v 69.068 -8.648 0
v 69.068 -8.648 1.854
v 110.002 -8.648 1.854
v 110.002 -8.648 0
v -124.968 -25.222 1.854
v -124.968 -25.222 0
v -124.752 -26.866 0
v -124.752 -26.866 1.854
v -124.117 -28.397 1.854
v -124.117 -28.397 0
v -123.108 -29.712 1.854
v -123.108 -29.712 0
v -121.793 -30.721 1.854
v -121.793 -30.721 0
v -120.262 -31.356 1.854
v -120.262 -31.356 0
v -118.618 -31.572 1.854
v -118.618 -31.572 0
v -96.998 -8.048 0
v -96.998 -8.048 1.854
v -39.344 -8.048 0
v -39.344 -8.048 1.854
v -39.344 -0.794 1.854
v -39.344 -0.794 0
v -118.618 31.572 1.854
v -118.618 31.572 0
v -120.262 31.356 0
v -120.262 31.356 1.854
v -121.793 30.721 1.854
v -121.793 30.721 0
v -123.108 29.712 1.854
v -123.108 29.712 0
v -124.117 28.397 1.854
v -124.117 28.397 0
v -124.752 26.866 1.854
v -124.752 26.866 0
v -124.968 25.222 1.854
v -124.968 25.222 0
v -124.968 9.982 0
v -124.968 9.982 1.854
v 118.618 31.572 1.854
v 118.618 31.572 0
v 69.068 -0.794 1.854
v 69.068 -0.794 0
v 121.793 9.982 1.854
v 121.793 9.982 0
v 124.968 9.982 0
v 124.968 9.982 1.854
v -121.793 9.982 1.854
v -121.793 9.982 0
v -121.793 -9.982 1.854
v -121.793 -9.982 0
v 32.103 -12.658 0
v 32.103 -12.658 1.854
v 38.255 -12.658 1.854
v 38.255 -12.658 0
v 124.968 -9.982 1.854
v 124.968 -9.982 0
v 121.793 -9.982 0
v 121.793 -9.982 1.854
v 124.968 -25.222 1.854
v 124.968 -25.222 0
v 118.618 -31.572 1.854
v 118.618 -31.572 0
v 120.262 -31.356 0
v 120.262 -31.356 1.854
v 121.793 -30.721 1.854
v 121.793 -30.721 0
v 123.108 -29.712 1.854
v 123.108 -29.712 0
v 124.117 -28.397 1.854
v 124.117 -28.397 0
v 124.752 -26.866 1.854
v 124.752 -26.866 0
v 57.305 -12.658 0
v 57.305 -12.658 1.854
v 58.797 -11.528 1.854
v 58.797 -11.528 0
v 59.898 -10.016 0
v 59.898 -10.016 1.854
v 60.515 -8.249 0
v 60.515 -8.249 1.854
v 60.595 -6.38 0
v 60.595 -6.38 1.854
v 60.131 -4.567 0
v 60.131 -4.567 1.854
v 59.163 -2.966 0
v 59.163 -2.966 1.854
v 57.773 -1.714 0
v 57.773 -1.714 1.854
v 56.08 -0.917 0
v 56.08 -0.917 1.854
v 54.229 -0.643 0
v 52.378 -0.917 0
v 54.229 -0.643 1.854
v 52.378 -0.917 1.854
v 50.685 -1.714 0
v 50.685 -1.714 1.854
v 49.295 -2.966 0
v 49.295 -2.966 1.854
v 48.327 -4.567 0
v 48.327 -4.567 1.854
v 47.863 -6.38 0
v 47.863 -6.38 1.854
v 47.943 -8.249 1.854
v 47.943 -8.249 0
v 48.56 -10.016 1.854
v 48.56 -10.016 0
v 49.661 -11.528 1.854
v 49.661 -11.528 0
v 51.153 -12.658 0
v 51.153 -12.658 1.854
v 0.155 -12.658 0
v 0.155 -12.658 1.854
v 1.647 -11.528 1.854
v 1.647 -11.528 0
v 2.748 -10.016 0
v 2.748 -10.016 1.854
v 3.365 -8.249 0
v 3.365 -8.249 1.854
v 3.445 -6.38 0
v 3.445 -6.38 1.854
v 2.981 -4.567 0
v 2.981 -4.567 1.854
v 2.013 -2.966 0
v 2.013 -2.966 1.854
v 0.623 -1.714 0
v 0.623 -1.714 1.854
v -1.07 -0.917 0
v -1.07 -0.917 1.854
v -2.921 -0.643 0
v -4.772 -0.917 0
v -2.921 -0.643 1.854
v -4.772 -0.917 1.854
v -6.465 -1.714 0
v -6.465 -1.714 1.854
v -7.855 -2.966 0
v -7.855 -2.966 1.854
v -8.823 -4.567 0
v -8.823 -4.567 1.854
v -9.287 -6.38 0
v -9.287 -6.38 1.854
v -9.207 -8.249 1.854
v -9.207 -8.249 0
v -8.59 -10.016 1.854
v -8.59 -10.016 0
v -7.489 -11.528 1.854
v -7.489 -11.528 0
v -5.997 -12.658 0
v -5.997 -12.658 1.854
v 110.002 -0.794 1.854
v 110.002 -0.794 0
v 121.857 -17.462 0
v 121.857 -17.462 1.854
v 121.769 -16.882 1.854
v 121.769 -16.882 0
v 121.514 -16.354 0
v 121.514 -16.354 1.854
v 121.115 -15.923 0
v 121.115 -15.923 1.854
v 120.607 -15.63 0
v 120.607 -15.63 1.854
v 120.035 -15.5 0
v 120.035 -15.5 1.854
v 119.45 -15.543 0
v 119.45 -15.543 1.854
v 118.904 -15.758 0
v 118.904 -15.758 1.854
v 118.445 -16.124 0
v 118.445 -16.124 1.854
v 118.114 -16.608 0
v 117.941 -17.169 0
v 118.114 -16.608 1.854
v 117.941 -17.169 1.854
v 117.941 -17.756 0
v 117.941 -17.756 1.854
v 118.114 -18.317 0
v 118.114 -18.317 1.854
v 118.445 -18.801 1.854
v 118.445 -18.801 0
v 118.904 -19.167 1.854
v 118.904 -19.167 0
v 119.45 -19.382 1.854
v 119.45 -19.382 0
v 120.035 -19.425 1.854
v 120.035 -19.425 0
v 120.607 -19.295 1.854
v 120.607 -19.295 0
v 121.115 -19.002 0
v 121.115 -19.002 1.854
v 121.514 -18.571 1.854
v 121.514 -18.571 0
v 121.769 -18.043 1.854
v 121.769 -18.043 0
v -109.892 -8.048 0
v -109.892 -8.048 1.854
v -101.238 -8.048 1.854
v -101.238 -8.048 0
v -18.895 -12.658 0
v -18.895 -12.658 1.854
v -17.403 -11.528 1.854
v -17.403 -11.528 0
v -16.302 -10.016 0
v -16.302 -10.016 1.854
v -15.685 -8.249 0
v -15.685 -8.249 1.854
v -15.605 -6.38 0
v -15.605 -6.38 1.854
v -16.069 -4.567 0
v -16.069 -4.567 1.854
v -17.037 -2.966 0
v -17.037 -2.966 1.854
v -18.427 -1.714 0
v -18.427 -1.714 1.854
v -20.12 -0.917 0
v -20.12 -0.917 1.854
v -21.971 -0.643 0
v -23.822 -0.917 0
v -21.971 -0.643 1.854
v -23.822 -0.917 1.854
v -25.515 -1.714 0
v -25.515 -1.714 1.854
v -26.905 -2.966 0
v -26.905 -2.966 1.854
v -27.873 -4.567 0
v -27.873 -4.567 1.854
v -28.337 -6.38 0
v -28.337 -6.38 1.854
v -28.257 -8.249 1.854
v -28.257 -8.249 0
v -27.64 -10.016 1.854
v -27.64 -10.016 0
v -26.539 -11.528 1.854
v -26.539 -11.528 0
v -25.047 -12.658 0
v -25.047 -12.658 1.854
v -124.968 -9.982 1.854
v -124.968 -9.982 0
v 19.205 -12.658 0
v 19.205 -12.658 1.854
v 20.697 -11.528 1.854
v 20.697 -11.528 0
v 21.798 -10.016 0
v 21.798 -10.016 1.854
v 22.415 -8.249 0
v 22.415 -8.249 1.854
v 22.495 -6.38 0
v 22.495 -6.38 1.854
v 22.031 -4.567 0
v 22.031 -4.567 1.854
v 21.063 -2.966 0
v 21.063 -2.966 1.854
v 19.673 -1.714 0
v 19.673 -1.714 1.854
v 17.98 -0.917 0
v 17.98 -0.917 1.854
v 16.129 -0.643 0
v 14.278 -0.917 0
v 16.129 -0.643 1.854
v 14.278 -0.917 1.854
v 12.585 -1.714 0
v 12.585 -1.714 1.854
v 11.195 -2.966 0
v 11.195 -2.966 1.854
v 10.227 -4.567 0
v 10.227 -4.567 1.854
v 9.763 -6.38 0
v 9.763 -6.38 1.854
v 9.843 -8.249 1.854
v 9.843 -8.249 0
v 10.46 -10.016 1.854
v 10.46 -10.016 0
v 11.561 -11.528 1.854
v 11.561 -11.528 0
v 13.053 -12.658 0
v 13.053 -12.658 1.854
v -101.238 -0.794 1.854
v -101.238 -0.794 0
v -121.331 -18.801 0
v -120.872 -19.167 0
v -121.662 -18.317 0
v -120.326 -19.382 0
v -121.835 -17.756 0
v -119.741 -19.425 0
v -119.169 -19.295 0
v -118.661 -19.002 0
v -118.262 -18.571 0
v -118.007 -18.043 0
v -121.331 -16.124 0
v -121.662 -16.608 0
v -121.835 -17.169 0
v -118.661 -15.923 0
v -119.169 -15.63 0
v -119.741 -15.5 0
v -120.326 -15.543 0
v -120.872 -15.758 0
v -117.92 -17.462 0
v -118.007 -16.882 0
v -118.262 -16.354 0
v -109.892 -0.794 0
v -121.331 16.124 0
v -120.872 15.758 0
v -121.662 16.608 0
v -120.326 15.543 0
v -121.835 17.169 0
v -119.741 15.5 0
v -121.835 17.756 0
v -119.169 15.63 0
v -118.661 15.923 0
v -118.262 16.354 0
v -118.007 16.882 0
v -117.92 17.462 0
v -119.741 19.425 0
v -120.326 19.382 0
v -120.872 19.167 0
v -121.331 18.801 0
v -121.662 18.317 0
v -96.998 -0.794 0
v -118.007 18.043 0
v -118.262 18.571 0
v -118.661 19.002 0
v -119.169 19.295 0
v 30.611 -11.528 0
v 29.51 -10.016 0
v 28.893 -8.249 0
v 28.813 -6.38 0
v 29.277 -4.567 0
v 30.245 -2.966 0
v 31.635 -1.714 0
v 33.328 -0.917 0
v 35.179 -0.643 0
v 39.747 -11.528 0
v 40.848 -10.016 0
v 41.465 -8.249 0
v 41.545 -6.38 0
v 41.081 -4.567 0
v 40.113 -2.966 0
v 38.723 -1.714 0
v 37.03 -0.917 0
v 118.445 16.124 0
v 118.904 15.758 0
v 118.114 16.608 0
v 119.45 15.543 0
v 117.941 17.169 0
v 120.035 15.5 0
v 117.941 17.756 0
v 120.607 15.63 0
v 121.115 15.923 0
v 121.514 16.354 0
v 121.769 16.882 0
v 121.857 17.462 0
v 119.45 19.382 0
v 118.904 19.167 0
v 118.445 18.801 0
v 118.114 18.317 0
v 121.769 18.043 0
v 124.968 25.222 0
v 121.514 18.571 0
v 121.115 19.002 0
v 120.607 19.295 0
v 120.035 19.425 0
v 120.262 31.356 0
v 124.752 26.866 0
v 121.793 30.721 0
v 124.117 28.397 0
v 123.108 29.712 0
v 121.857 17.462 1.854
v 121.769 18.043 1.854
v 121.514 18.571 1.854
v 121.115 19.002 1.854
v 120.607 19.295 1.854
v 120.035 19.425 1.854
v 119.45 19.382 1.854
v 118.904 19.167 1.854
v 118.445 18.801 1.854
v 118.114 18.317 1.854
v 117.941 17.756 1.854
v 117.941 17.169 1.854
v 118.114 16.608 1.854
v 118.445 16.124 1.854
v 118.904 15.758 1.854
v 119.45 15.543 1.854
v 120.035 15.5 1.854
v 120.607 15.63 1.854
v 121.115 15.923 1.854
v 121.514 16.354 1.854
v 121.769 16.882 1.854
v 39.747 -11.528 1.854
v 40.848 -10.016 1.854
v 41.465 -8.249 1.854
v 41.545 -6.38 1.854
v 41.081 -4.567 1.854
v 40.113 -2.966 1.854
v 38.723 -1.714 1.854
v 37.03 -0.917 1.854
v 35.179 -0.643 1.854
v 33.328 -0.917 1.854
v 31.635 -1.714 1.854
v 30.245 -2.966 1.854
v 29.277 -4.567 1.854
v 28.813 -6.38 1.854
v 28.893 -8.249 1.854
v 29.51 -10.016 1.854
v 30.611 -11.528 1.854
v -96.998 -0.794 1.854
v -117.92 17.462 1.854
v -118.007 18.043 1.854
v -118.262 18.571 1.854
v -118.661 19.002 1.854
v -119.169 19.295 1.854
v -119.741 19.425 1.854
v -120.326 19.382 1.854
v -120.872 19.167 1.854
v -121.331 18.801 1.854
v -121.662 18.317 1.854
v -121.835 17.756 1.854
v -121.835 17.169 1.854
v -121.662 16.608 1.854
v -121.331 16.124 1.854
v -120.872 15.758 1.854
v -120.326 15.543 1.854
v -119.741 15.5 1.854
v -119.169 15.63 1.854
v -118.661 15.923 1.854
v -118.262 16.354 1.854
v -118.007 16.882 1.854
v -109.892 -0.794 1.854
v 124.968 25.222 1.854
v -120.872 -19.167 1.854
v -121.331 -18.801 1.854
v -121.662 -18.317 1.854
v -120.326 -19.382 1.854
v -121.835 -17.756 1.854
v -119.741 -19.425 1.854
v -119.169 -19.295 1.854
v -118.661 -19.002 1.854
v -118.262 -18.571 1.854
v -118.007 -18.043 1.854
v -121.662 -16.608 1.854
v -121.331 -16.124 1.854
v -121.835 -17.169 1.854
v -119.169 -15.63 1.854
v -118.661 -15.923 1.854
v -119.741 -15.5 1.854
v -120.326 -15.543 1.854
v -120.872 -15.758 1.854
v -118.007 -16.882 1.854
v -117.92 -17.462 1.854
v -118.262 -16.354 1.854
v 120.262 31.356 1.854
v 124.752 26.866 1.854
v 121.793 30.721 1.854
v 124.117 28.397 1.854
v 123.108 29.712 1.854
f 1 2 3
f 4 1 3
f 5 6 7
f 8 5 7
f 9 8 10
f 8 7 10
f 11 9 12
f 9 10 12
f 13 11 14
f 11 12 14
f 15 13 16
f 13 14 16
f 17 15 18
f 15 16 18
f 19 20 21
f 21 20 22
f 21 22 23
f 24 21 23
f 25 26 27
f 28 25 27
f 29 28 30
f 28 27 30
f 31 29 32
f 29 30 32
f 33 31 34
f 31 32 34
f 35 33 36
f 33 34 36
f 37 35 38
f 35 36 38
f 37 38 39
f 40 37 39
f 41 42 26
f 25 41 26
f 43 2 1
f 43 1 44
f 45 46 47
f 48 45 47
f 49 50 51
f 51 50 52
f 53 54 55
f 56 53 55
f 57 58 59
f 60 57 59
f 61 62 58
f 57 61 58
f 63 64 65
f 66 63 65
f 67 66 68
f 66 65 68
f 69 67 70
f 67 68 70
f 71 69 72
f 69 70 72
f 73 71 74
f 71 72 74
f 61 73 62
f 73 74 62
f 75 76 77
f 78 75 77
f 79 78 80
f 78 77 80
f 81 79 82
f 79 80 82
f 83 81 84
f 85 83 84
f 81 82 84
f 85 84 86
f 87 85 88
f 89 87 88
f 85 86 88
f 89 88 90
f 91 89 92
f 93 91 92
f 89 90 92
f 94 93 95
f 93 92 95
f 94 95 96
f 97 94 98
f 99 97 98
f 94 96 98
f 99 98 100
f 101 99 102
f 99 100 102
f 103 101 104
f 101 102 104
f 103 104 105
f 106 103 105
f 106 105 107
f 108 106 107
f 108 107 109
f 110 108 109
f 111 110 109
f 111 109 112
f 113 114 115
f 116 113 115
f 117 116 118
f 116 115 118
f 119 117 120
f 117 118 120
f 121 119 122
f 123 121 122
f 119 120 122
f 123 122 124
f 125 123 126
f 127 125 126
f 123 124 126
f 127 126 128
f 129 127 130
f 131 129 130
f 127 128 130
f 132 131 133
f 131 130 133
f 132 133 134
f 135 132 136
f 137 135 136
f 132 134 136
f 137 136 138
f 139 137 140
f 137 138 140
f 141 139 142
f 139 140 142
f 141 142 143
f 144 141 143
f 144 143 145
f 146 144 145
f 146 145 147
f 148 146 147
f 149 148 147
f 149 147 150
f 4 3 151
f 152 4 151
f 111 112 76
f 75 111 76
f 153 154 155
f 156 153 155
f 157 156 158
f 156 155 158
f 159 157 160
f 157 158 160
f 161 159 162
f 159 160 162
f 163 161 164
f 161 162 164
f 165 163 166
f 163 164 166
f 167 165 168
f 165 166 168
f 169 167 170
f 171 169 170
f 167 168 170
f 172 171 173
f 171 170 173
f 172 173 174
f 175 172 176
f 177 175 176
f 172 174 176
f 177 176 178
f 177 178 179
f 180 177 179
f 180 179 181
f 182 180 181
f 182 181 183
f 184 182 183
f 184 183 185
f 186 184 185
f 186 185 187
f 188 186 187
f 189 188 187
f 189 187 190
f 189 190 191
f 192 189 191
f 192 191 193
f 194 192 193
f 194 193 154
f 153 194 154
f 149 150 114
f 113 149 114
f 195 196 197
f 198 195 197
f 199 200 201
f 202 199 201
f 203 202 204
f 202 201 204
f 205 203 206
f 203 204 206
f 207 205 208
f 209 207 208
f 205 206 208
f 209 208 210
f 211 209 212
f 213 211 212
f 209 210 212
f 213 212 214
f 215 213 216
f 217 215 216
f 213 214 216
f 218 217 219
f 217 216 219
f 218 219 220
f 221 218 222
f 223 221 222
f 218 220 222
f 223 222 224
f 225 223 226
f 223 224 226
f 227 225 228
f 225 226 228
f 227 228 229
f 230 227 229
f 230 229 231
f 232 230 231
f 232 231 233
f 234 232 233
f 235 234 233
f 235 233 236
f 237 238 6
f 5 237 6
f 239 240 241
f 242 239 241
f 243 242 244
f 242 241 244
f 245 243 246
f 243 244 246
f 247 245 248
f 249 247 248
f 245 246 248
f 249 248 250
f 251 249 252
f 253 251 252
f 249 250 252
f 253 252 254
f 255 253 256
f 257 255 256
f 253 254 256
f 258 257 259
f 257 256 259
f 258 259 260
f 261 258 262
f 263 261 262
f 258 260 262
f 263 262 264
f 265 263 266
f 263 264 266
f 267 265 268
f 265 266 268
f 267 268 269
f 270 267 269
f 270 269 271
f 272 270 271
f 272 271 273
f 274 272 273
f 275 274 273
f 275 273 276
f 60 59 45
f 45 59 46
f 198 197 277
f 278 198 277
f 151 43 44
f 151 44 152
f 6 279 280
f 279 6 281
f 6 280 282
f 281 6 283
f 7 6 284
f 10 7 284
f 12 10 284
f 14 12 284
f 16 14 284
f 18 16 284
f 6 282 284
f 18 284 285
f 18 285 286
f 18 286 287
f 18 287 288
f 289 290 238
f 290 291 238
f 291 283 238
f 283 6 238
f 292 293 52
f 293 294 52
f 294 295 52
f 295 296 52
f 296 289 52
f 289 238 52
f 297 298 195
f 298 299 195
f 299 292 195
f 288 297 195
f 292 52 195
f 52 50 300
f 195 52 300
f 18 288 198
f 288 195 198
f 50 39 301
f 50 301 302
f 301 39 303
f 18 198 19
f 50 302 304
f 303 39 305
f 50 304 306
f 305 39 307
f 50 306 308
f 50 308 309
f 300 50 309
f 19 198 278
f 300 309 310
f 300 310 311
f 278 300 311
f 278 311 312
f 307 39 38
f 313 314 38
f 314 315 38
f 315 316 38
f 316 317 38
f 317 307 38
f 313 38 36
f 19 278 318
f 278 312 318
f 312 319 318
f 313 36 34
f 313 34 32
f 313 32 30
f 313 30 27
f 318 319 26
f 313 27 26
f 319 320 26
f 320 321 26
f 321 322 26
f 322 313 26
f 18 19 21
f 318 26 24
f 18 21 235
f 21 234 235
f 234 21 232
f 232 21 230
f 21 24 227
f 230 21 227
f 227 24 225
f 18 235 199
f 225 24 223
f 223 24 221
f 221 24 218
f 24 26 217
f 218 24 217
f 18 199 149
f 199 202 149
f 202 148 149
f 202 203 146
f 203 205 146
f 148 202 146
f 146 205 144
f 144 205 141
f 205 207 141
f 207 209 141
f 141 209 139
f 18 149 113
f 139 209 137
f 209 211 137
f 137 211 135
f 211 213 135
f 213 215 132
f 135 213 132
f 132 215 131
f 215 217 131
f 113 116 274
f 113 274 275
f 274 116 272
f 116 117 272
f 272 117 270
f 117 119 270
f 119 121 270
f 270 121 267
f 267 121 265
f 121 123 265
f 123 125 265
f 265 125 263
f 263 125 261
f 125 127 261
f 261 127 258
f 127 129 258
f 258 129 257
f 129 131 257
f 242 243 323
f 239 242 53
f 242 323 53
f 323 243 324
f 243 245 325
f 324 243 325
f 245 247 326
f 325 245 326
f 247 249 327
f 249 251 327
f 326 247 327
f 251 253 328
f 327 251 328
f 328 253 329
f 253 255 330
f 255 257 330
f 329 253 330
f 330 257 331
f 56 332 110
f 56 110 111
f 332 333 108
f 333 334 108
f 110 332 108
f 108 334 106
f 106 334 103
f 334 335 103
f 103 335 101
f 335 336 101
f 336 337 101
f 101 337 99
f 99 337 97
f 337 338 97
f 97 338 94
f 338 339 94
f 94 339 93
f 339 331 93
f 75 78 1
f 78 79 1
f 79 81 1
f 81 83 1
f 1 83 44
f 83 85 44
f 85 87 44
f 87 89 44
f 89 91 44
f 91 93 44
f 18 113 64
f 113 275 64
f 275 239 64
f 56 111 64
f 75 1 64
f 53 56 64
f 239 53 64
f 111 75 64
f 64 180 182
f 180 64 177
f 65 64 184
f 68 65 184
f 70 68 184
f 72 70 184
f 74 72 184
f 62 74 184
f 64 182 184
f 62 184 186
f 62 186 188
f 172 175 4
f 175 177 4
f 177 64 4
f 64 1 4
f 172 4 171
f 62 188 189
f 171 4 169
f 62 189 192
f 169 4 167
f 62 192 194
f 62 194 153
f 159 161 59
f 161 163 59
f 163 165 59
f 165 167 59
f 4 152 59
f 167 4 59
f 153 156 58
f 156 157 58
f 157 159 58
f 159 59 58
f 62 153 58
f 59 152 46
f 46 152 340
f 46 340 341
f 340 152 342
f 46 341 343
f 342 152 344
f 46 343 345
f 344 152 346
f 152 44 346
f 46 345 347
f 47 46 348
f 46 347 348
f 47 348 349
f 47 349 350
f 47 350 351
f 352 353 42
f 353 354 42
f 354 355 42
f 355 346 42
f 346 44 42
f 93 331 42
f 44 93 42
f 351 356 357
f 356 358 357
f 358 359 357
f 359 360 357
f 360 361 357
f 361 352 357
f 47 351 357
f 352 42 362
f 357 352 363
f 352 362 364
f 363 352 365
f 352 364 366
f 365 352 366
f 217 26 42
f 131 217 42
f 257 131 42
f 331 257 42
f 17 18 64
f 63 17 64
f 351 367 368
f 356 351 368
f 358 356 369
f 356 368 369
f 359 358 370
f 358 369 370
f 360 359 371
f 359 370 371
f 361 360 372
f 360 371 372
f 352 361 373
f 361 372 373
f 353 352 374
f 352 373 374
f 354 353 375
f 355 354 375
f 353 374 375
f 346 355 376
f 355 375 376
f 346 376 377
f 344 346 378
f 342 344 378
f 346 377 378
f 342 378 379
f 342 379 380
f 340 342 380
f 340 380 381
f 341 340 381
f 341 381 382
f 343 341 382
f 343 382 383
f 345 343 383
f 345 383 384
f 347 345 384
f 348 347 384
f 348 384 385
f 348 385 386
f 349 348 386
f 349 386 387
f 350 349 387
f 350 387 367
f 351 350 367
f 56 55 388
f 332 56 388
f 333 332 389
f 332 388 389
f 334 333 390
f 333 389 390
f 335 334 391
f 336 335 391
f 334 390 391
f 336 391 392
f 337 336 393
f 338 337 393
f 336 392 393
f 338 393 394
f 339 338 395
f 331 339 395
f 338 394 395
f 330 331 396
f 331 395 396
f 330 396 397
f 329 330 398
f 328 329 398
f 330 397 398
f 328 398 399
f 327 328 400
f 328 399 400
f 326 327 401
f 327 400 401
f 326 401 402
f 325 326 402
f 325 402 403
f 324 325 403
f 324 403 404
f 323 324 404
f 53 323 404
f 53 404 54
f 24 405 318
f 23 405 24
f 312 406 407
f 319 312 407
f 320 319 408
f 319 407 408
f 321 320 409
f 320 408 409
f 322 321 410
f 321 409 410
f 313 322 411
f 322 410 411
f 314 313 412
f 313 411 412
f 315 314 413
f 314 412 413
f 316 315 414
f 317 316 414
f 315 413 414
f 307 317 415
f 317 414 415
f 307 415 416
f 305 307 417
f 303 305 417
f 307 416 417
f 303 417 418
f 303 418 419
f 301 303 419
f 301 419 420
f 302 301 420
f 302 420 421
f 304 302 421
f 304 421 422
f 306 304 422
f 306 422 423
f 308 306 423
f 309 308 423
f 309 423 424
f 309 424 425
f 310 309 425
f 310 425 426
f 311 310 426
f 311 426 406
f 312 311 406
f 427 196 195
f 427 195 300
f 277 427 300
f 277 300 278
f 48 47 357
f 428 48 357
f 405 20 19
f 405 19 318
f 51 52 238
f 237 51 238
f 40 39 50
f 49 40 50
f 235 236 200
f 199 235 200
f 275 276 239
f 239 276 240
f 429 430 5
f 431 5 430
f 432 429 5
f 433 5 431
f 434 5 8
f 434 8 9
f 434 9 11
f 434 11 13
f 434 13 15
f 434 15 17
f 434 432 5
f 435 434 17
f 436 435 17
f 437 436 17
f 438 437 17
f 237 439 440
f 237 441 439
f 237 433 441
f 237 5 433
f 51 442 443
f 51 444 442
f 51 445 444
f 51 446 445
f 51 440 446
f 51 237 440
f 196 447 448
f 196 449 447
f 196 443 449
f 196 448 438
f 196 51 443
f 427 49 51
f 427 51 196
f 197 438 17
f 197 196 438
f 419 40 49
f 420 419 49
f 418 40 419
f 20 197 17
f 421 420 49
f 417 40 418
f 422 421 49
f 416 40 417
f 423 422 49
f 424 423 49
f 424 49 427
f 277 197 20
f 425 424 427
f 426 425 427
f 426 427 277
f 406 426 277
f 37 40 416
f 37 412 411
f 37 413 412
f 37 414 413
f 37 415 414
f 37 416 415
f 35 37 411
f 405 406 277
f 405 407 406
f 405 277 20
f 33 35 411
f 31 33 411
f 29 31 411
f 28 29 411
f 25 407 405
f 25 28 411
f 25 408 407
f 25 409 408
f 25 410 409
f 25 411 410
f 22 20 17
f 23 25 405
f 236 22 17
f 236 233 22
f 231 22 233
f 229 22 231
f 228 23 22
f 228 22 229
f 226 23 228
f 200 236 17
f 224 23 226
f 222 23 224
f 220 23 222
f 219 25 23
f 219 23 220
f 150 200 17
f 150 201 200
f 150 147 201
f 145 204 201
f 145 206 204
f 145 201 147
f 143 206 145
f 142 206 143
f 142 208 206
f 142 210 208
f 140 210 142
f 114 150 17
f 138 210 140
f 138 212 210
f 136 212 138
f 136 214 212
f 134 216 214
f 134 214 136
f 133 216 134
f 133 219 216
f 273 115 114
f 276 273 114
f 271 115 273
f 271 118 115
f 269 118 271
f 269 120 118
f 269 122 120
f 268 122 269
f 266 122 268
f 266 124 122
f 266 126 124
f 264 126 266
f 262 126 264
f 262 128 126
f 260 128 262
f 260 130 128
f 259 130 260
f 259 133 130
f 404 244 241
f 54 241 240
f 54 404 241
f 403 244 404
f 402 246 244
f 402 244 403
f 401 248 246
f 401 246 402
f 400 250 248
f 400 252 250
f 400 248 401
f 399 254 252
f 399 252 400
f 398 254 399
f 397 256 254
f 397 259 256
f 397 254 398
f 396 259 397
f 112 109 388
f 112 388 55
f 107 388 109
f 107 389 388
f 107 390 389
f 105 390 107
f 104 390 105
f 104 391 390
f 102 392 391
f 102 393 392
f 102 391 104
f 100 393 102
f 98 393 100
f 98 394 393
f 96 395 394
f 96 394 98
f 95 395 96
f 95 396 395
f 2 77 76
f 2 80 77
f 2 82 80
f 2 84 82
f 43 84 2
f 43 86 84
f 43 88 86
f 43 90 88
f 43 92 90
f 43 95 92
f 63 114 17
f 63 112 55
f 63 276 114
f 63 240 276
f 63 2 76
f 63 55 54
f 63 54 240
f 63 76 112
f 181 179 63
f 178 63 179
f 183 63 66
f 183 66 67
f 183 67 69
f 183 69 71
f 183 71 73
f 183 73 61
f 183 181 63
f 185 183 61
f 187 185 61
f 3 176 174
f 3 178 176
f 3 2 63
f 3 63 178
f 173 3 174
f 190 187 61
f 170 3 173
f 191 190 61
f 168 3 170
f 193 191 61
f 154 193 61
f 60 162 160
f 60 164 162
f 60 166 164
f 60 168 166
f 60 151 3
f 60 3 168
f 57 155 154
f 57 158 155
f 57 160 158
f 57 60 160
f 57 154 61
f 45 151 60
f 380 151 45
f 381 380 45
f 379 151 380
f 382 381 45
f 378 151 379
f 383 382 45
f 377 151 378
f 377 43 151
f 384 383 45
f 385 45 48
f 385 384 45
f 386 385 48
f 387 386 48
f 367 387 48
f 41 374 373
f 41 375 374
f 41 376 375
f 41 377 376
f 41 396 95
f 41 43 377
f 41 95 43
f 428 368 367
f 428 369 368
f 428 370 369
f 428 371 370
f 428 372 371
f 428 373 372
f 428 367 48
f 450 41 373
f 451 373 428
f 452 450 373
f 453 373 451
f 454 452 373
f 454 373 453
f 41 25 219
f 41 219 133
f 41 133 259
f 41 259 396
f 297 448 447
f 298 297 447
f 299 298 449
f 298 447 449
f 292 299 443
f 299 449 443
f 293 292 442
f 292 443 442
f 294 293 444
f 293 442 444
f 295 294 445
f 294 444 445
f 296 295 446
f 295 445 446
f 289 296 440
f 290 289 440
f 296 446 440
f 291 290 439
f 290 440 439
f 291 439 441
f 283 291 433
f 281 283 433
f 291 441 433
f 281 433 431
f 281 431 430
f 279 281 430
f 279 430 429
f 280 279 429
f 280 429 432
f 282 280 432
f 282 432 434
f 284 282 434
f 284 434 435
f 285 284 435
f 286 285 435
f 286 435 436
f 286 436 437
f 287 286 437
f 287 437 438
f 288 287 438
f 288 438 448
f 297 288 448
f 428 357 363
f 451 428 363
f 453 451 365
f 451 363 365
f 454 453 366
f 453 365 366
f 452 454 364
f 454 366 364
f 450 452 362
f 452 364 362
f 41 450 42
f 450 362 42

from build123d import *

# Parameters (mm, degrees)
MAINBODY_DEPTH    = 1.8542
SKETCH3_R         = 1.9685
MOUNTHOLES_DEPTH  = 129.907885308
PANELCUTOUT_REACH = 130.908
SKETCH4_W         = 40.934
SKETCH4_H         = 7.854
SKETCH4_W_2       = 57.654
SKETCH4_H_2       = 7.254
SKETCH4_W_3       = 8.654


with BuildPart() as part:
    # Sketch2 → MainBody (new body)
    with BuildSketch(Plane.XY):
        with BuildLine():
            Line((118.618, 31.5722), (-118.618, 31.5722))
            ThreePointArc((-118.618, 31.5722), (-123.108128061, 29.712328061), (-124.968, 25.2222))
            Line((-124.968, 25.2222), (-124.968, 9.9822))
            Line((-124.968, 9.9822), (-121.793, 9.9822))
            Line((-121.793, 9.9822), (-121.793, -9.9822))
            Line((-121.793, -9.9822), (-124.968, -9.9822))
            Line((-124.968, -9.9822), (-124.968, -25.2222))
            ThreePointArc((-124.968, -25.2222), (-123.108128061, -29.712328061), (-118.618, -31.5722))
            Line((-118.618, -31.5722), (118.618, -31.5722))
            ThreePointArc((118.618, -31.5722), (123.108128061, -29.712328061), (124.968, -25.2222))
            Line((124.968, -25.2222), (124.968, -9.9822))
            Line((124.968, -9.9822), (121.793, -9.9822))
            Line((121.793, -9.9822), (121.793, 9.9822))
            Line((121.793, 9.9822), (124.968, 9.9822))
            Line((124.968, 9.9822), (124.968, 25.2222))
            ThreePointArc((124.968, 25.2222), (123.108128061, 29.712328061), (118.618, 31.5722))
        make_face()
    extrude(amount=MAINBODY_DEPTH)

    # Sketch3 → MountHoles (cut, through all)
    with BuildSketch(Plane.XY.offset(1.8542)):
        with Locations((-119.888, 17.4625)):
            Circle(SKETCH3_R)
        with Locations((119.888, 17.4625)):
            Circle(SKETCH3_R)
        with Locations((119.888, -17.4625)):
            Circle(SKETCH3_R)
        with Locations((-119.888, -17.4625)):
            Circle(SKETCH3_R)
    extrude(amount=-MOUNTHOLES_DEPTH, mode=Mode.SUBTRACT)

    # Sketch4 → PanelCutout (cut, up to next)
    with BuildSketch(Plane.XY.offset(1.8542), mode=Mode.PRIVATE) as panelcutout_sk1:
        with BuildLine():
            Line((51.153291776, -12.65754977), (57.304708224, -12.65754977))
            ThreePointArc((57.304708224, -12.65754977), (54.229, -0.64334977), (51.153291776, -12.65754977))
        make_face()
    panelcutout_tool1 = extrude(panelcutout_sk1.sketch, amount=-PANELCUTOUT_REACH, mode=Mode.PRIVATE) & part.part
    # Sketch4 → PanelCutout (cut, up to next)
    with BuildSketch(Plane.XY.offset(1.8542), mode=Mode.PRIVATE) as panelcutout_sk2:
        with Locations((89.535, -4.72055)):
            Rectangle(SKETCH4_W, SKETCH4_H)
    panelcutout_tool2 = extrude(panelcutout_sk2.sketch, amount=-PANELCUTOUT_REACH, mode=Mode.PRIVATE) & part.part
    # Sketch4 → PanelCutout (cut, up to next)
    with BuildSketch(Plane.XY.offset(1.8542), mode=Mode.PRIVATE) as panelcutout_sk3:
        with BuildLine():
            Line((32.103291776, -12.65754977), (38.254708224, -12.65754977))
            ThreePointArc((38.254708224, -12.65754977), (35.179, -0.64334977), (32.103291776, -12.65754977))
        make_face()
    panelcutout_tool3 = extrude(panelcutout_sk3.sketch, amount=-PANELCUTOUT_REACH, mode=Mode.PRIVATE) & part.part
    # Sketch4 → PanelCutout (cut, up to next)
    with BuildSketch(Plane.XY.offset(1.8542), mode=Mode.PRIVATE) as panelcutout_sk4:
        with BuildLine():
            Line((13.053291776, -12.65754977), (19.204708224, -12.65754977))
            ThreePointArc((19.204708224, -12.65754977), (16.129, -0.64334977), (13.053291776, -12.65754977))
        make_face()
    panelcutout_tool4 = extrude(panelcutout_sk4.sketch, amount=-PANELCUTOUT_REACH, mode=Mode.PRIVATE) & part.part
    # Sketch4 → PanelCutout (cut, up to next)
    with BuildSketch(Plane.XY.offset(1.8542), mode=Mode.PRIVATE) as panelcutout_sk5:
        with BuildLine():
            Line((-5.996708224, -12.65754977), (0.154708224, -12.65754977))
            ThreePointArc((0.154708224, -12.65754977), (-2.921, -0.64334977), (-5.996708224, -12.65754977))
        make_face()
    panelcutout_tool5 = extrude(panelcutout_sk5.sketch, amount=-PANELCUTOUT_REACH, mode=Mode.PRIVATE) & part.part
    # Sketch4 → PanelCutout (cut, up to next)
    with BuildSketch(Plane.XY.offset(1.8542), mode=Mode.PRIVATE) as panelcutout_sk6:
        with BuildLine():
            Line((-25.046708224, -12.65754977), (-18.895291776, -12.65754977))
            ThreePointArc((-18.895291776, -12.65754977), (-21.971, -0.64334977), (-25.046708224, -12.65754977))
        make_face()
    panelcutout_tool6 = extrude(panelcutout_sk6.sketch, amount=-PANELCUTOUT_REACH, mode=Mode.PRIVATE) & part.part
    # Sketch4 → PanelCutout (cut, up to next)
    with BuildSketch(Plane.XY.offset(1.8542), mode=Mode.PRIVATE) as panelcutout_sk7:
        with Locations((-68.171, -4.42055)):
            Rectangle(SKETCH4_W_2, SKETCH4_H_2)
    panelcutout_tool7 = extrude(panelcutout_sk7.sketch, amount=-PANELCUTOUT_REACH, mode=Mode.PRIVATE) & part.part
    # Sketch4 → PanelCutout (cut, up to next)
    with BuildSketch(Plane.XY.offset(1.8542), mode=Mode.PRIVATE) as panelcutout_sk8:
        with Locations((-105.5650001, -4.42055)):
            Rectangle(SKETCH4_W_3, SKETCH4_H_2)
    panelcutout_tool8 = extrude(panelcutout_sk8.sketch, amount=-PANELCUTOUT_REACH, mode=Mode.PRIVATE) & part.part
    add(panelcutout_tool1.solids().sort_by_distance((54.229, -6.889516, 1.8542))[0], mode=Mode.SUBTRACT)
    add(panelcutout_tool2.solids().sort_by_distance((89.535, -4.72055, 1.8542))[0], mode=Mode.SUBTRACT)
    add(panelcutout_tool3.solids().sort_by_distance((35.179, -6.889516, 1.8542))[0], mode=Mode.SUBTRACT)
    add(panelcutout_tool4.solids().sort_by_distance((16.129, -6.889516, 1.8542))[0], mode=Mode.SUBTRACT)
    add(panelcutout_tool5.solids().sort_by_distance((-2.921, -6.889516, 1.8542))[0], mode=Mode.SUBTRACT)
    add(panelcutout_tool6.solids().sort_by_distance((-21.971, -6.889516, 1.8542))[0], mode=Mode.SUBTRACT)
    add(panelcutout_tool7.solids().sort_by_distance((-68.171, -4.42055, 1.8542))[0], mode=Mode.SUBTRACT)
    add(panelcutout_tool8.solids().sort_by_distance((-105.565, -4.42055, 1.8542))[0], mode=Mode.SUBTRACT)


solid = part.part
